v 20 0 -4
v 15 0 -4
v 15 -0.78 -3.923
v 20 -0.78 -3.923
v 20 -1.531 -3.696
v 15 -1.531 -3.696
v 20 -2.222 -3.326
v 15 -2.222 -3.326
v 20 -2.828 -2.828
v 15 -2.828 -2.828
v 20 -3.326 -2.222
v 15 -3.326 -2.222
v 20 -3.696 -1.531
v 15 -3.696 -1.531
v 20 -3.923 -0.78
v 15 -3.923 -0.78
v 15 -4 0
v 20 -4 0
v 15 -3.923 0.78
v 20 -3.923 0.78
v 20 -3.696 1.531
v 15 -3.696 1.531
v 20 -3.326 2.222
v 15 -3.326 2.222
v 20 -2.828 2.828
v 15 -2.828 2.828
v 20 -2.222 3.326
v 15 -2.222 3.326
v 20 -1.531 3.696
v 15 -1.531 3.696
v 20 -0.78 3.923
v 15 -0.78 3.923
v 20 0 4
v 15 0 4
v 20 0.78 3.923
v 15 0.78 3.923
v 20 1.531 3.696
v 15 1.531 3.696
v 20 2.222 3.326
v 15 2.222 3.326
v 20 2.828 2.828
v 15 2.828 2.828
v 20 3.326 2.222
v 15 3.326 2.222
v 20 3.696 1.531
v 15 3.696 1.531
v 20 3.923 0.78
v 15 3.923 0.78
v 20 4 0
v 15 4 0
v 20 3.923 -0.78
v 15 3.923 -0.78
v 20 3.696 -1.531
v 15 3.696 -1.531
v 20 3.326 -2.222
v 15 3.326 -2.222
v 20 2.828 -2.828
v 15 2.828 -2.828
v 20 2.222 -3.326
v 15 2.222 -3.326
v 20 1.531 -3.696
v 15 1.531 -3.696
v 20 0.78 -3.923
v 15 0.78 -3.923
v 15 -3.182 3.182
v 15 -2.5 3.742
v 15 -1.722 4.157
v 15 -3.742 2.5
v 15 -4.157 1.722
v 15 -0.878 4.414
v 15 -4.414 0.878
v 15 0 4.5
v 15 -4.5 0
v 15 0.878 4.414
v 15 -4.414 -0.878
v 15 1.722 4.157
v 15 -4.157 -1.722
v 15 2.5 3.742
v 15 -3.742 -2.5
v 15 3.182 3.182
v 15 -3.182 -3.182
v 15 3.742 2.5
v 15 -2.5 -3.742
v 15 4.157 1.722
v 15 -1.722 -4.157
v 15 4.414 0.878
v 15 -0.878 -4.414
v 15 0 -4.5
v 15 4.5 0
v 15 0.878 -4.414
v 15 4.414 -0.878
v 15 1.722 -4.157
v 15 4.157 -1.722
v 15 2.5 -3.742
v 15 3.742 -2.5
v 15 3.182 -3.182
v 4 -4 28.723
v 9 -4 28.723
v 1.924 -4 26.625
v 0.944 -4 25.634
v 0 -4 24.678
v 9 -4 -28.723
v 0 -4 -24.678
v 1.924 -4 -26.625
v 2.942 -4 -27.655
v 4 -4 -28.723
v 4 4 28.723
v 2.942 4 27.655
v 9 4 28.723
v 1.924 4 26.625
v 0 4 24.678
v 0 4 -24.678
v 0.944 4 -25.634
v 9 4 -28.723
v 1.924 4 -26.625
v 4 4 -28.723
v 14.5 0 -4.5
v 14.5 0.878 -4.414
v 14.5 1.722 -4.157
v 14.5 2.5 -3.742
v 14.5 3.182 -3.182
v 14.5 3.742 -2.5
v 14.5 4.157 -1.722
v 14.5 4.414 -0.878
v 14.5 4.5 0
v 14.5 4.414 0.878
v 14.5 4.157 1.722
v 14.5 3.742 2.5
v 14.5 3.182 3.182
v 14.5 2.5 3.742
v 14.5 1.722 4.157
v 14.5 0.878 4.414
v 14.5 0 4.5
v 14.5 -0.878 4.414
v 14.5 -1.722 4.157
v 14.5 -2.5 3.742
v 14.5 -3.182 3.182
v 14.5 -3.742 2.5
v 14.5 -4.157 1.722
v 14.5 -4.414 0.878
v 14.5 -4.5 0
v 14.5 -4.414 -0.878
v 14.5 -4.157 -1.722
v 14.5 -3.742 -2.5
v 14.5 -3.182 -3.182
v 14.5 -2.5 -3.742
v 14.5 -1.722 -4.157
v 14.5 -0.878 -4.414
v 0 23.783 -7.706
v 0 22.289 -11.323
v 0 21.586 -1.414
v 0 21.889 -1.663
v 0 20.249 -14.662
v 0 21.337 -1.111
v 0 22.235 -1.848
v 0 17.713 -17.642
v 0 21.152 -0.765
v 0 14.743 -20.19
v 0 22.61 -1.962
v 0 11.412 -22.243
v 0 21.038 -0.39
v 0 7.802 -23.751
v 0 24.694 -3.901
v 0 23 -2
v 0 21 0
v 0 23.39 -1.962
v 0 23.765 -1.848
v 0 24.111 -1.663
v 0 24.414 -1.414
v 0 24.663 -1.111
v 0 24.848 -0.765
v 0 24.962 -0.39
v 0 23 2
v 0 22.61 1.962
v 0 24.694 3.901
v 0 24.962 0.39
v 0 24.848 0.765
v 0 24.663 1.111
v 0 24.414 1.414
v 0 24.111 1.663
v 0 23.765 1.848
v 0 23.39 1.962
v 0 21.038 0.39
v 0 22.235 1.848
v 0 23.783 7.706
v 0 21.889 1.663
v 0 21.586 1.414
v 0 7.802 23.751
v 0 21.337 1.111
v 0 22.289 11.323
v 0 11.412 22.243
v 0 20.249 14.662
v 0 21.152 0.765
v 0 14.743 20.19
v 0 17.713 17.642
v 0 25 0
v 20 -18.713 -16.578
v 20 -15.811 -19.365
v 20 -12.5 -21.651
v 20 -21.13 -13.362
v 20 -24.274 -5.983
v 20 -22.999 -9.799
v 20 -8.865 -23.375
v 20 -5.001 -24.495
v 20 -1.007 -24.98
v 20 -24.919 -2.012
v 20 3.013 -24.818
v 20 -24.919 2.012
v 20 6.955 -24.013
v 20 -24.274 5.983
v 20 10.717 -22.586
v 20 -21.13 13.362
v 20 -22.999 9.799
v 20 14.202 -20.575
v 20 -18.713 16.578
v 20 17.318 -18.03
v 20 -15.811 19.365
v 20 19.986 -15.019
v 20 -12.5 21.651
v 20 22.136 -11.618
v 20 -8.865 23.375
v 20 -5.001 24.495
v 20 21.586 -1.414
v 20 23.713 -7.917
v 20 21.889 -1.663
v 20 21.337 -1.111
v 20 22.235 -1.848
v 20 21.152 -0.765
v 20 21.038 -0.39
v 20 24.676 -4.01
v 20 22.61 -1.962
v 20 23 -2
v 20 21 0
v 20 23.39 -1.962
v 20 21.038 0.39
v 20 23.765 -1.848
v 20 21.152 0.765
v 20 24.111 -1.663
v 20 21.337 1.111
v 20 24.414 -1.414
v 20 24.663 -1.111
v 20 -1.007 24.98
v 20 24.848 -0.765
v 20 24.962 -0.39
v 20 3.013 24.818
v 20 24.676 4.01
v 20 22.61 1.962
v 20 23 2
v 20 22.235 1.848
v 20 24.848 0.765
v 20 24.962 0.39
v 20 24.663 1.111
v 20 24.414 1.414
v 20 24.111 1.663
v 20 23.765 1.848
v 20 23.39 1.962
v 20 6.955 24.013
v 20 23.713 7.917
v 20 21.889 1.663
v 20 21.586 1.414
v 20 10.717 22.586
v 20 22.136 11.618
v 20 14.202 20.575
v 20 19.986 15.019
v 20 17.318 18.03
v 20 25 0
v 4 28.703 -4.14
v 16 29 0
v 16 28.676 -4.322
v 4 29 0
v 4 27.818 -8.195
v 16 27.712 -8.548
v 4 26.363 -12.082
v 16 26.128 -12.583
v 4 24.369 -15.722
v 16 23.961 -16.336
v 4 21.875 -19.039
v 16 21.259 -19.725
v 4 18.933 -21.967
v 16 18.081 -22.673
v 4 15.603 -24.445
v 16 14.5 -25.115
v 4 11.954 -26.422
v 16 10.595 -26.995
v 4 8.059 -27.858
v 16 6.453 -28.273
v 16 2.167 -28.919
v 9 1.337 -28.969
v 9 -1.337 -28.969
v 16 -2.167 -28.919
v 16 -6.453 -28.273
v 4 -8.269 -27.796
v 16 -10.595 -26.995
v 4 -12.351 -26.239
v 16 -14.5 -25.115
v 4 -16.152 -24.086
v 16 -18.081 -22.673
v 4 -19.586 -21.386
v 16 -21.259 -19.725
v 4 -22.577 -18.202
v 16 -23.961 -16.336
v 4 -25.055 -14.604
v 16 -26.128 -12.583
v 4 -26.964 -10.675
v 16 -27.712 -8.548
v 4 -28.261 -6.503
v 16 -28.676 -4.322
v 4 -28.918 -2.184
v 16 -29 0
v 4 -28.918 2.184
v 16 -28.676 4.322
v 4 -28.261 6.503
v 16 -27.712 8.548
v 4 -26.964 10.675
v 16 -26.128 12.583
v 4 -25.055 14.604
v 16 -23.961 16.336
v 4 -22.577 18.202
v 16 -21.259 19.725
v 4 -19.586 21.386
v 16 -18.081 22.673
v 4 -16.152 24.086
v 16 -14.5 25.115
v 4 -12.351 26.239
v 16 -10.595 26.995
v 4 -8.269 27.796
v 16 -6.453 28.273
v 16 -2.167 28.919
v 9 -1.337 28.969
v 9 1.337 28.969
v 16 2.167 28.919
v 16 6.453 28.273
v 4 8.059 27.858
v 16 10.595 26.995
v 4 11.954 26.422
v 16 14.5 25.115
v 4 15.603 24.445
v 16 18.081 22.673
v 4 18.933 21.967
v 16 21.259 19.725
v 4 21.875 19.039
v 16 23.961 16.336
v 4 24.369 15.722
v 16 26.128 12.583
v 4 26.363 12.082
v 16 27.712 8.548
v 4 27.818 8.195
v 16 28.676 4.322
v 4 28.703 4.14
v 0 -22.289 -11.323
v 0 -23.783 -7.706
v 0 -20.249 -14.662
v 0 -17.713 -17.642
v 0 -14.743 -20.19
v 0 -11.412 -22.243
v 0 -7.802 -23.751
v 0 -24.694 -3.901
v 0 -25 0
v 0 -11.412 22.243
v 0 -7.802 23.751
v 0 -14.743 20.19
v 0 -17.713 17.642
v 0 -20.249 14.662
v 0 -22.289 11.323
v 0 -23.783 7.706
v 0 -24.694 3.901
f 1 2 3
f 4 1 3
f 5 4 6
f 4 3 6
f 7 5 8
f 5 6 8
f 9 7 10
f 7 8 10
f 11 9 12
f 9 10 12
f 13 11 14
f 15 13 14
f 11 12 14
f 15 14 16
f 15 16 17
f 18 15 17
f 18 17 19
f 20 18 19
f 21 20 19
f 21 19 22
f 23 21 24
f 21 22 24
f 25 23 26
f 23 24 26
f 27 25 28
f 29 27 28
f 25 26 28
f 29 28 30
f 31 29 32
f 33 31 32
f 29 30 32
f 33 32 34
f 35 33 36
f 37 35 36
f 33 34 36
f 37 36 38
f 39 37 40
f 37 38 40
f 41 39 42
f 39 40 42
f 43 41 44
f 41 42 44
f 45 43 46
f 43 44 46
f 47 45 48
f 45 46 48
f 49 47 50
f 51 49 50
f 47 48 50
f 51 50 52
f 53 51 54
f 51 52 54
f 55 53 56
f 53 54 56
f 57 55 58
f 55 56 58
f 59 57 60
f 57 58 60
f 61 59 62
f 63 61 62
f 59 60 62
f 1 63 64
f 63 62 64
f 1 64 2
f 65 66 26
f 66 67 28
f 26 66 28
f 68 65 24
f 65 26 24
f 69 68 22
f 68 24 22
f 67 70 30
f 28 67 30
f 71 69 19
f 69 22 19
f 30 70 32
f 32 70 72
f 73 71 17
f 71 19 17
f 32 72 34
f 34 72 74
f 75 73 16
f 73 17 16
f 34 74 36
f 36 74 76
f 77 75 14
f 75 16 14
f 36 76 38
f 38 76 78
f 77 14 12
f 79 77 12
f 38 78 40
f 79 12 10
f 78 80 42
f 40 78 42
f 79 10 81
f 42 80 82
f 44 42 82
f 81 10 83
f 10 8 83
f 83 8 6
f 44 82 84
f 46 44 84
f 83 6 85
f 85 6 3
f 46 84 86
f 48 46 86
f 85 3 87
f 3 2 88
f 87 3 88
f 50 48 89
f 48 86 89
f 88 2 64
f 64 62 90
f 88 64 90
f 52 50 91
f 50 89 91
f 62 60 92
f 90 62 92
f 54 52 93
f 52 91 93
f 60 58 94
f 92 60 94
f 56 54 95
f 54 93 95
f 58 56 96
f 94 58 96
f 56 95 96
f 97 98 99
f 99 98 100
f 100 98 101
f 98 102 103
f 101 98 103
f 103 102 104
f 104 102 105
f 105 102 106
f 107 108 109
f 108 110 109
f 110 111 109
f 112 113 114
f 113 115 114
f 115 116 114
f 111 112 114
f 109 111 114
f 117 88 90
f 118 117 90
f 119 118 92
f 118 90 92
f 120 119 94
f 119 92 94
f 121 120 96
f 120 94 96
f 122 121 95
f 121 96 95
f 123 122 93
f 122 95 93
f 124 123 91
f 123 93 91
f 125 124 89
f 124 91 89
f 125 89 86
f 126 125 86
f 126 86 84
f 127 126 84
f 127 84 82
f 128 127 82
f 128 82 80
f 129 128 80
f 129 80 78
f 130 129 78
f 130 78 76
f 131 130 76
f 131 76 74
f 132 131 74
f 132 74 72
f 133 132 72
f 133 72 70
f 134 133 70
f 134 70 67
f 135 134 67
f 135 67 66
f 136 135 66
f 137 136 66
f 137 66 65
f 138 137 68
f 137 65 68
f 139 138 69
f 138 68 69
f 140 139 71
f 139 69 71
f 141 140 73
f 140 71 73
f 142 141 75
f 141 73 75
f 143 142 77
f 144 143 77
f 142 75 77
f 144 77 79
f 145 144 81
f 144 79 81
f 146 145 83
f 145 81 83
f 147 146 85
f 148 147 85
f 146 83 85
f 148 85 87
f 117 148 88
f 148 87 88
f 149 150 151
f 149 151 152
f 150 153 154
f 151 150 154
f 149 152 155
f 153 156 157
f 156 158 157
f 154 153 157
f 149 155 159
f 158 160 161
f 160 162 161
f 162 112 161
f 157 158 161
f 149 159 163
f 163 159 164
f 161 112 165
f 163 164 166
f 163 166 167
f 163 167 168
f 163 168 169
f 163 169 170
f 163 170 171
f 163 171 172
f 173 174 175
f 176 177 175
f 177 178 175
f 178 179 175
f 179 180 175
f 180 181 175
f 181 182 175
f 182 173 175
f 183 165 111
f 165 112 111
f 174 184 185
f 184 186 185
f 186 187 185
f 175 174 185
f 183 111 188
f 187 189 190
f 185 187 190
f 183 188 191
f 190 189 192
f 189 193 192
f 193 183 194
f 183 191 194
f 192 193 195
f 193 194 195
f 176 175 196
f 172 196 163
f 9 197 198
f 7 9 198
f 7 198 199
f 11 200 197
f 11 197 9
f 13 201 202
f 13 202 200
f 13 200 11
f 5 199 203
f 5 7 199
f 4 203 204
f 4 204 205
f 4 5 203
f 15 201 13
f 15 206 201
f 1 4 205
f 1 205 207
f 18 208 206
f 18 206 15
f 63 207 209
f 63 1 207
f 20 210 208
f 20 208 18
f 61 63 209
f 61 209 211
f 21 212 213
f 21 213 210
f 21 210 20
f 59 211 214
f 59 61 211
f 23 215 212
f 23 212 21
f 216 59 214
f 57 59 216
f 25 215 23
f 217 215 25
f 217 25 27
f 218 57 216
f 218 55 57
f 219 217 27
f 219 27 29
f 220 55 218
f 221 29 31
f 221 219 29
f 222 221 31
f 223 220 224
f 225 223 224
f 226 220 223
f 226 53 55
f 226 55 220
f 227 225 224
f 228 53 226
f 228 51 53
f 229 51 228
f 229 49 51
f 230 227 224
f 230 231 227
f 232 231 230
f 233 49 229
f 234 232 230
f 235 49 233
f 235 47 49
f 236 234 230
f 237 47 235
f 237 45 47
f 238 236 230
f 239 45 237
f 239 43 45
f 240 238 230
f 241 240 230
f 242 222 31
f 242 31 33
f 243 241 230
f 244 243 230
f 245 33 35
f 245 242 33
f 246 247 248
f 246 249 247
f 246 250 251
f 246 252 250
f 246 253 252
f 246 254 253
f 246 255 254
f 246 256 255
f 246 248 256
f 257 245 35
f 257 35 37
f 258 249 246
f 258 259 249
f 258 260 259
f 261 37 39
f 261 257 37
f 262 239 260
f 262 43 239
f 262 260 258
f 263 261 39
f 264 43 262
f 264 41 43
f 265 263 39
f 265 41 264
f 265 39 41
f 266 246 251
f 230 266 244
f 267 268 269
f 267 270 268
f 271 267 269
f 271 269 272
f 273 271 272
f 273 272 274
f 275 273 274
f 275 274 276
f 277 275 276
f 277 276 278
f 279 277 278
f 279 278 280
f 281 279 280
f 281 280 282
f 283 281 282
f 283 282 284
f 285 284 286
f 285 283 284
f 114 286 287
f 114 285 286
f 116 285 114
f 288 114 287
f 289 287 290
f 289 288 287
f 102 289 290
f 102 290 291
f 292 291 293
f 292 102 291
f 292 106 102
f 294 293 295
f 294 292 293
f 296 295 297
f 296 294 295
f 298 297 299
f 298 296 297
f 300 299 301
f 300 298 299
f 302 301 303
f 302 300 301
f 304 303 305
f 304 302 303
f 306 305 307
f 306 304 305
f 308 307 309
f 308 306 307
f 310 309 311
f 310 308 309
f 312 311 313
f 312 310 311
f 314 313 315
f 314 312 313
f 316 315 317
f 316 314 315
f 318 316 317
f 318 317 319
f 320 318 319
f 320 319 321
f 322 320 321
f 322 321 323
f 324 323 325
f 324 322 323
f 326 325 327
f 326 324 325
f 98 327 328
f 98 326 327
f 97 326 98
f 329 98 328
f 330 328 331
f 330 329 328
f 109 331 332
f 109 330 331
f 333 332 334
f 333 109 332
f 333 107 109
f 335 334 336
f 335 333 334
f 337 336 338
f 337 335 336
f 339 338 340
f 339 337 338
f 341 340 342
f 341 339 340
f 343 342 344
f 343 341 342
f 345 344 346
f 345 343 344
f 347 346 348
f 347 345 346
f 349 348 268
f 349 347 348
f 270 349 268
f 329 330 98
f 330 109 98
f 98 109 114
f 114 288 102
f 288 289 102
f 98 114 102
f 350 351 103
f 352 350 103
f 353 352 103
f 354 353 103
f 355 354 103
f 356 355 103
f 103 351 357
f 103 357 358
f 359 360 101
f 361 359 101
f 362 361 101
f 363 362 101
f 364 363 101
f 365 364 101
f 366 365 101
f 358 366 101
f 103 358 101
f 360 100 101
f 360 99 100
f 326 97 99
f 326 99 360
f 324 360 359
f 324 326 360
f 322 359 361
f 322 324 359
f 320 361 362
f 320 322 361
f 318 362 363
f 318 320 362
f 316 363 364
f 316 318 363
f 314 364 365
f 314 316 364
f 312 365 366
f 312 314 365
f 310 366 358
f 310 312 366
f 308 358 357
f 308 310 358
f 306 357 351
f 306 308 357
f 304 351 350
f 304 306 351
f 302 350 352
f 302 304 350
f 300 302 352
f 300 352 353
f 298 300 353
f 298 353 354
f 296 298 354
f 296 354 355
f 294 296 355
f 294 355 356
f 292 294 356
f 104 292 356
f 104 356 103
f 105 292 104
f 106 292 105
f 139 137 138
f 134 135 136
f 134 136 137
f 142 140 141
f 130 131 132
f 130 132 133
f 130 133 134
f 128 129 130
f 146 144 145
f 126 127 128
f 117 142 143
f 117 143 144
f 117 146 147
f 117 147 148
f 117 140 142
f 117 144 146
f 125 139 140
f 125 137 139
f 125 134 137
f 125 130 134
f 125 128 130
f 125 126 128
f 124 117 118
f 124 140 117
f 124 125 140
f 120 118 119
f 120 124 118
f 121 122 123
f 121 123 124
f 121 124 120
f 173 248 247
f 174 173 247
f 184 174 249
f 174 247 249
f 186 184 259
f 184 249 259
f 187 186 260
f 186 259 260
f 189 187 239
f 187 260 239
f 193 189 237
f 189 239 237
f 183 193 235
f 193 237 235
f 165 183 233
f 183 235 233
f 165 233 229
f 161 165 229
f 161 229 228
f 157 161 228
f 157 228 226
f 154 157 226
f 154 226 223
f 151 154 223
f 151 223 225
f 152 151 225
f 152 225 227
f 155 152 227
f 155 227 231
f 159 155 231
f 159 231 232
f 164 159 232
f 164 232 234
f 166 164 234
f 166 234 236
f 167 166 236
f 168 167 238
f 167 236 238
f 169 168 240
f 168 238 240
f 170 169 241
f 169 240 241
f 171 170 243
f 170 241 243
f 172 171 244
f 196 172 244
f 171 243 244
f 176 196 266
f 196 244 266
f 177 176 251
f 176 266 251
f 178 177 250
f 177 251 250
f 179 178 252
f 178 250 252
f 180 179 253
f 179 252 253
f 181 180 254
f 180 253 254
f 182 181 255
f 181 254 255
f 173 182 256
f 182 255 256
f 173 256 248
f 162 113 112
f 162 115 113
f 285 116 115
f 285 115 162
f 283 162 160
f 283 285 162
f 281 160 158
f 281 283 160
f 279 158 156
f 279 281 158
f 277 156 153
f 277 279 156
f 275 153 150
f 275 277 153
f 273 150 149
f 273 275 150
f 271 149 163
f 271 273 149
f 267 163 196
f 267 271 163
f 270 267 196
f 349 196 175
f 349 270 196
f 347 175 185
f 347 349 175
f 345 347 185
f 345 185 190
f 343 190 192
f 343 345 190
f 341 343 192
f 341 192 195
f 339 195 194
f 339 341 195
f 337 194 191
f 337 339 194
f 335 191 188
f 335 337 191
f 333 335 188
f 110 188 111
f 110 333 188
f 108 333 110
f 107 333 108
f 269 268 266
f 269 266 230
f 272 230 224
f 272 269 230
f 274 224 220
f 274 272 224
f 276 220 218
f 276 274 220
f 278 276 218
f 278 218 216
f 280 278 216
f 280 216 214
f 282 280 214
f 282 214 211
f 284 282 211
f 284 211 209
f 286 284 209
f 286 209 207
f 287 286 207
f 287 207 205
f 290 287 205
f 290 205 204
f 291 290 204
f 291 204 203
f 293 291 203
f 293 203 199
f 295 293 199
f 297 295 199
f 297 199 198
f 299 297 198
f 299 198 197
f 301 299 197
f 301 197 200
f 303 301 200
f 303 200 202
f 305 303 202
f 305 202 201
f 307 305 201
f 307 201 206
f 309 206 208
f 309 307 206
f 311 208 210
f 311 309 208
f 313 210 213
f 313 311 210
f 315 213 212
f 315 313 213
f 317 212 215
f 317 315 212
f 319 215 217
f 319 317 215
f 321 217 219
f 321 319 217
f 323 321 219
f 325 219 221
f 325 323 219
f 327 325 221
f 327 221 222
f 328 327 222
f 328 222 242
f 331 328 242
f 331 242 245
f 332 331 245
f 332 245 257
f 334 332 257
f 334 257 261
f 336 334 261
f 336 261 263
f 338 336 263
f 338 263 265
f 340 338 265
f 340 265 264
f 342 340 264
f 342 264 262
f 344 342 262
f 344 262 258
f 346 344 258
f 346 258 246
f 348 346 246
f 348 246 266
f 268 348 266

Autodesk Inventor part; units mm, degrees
ref_plane "YZ Plane" through (0, 0, 0) normal (1, 0, 0) x (0, 1, 0)
ref_plane "XZ Plane" through (0, 0, 0) normal (0, 1, 0) x (-1, 0, 0)
ref_plane "XY Plane" through (0, 0, 0) normal (0, 0, 1) x (1, 0, 0)
sketch "Эскиз5" plane through (0, 0, 0) normal (0, 0, 1) x (1, 0, 0)
  line L0 (0, 0) -> (20, 0)
  line L1 (20, 0) -> (20, 25)
  line L2 (16, 29) -> (4, 29)
  line L3 (0, 25) -> (0, 0)
  line L4 (4, 29) -> (0, 25)
  line L5 (16, 29) -> (20, 25)
  point P0 (20, 29)
  point P1 (0, 29)
  dimension "d33" = 20
  dimension "d34" = 29
  dimension "d35" = 4
  dimension "d36" = 4
  dimension "d37" = 4
  dimension "d38" = 4
revolve "Вращение3" add sketch "Эскиз5" angle 360 about axis through (0, 0, 0) along (1, 0, 0)
sketch "Эскиз6" plane through (0, 0, 0) normal (0, 0, 1) x (1, 0, 0)
  line L0 (0, -25) -> (0, 25) construction
  line L1 (0, 4) -> (9, 4)
  line L2 (9, 4) -> (9, -4)
  line L3 (9, -4) -> (0, -4)
  line L4 (0, -4) -> (0, 4)
  point P0 (0, 0)
  point P1 (0, 0)
  point P2 (0, 0)
  dimension "d40" = 9
  dimension "d41" = 8
extrude "Выдавливание2" cut sketch "Эскиз6" along normal through all both and the other way through all
sketch "Эскиз7" plane through (0, 0, 0) normal (-1, 0, 0) x (0, 0, 1)
  line L0 (0, 0) -> (0, 23) construction
  dimension "d44" = 23
hole "Отверстие2" at (0, 23, 0) direction (1, 0, 0) diameter 4 end through all
sketch "Эскиз8" plane through (20, 0, 0) normal (1, 0, 0) x (0, 0, -1)
  point P0 (0, 0)
  point P1 (0, 0)
hole "Отверстие3" at (20, 0, 0) direction (-1, 0, 0) diameter 8 depth 5
sketch "Эскиз9" plane through (15, 0, 0) normal (1, 0, 0) x (0, 0, -1)
  circle A0 centre (0, 0) radius 4.5
  dimension "d59" = 9
extrude "Выдавливание3" cut sketch "Эскиз9" against normal blind 0.5
thread "Резьба2" size "M8x1.25" class "6H" standard "ANSI Metric M Profile" full length
equation "\"d36\" = d35"
equation "\"d37\" = d35"
equation "\"d38\" = d37"
properties part number "711134"
